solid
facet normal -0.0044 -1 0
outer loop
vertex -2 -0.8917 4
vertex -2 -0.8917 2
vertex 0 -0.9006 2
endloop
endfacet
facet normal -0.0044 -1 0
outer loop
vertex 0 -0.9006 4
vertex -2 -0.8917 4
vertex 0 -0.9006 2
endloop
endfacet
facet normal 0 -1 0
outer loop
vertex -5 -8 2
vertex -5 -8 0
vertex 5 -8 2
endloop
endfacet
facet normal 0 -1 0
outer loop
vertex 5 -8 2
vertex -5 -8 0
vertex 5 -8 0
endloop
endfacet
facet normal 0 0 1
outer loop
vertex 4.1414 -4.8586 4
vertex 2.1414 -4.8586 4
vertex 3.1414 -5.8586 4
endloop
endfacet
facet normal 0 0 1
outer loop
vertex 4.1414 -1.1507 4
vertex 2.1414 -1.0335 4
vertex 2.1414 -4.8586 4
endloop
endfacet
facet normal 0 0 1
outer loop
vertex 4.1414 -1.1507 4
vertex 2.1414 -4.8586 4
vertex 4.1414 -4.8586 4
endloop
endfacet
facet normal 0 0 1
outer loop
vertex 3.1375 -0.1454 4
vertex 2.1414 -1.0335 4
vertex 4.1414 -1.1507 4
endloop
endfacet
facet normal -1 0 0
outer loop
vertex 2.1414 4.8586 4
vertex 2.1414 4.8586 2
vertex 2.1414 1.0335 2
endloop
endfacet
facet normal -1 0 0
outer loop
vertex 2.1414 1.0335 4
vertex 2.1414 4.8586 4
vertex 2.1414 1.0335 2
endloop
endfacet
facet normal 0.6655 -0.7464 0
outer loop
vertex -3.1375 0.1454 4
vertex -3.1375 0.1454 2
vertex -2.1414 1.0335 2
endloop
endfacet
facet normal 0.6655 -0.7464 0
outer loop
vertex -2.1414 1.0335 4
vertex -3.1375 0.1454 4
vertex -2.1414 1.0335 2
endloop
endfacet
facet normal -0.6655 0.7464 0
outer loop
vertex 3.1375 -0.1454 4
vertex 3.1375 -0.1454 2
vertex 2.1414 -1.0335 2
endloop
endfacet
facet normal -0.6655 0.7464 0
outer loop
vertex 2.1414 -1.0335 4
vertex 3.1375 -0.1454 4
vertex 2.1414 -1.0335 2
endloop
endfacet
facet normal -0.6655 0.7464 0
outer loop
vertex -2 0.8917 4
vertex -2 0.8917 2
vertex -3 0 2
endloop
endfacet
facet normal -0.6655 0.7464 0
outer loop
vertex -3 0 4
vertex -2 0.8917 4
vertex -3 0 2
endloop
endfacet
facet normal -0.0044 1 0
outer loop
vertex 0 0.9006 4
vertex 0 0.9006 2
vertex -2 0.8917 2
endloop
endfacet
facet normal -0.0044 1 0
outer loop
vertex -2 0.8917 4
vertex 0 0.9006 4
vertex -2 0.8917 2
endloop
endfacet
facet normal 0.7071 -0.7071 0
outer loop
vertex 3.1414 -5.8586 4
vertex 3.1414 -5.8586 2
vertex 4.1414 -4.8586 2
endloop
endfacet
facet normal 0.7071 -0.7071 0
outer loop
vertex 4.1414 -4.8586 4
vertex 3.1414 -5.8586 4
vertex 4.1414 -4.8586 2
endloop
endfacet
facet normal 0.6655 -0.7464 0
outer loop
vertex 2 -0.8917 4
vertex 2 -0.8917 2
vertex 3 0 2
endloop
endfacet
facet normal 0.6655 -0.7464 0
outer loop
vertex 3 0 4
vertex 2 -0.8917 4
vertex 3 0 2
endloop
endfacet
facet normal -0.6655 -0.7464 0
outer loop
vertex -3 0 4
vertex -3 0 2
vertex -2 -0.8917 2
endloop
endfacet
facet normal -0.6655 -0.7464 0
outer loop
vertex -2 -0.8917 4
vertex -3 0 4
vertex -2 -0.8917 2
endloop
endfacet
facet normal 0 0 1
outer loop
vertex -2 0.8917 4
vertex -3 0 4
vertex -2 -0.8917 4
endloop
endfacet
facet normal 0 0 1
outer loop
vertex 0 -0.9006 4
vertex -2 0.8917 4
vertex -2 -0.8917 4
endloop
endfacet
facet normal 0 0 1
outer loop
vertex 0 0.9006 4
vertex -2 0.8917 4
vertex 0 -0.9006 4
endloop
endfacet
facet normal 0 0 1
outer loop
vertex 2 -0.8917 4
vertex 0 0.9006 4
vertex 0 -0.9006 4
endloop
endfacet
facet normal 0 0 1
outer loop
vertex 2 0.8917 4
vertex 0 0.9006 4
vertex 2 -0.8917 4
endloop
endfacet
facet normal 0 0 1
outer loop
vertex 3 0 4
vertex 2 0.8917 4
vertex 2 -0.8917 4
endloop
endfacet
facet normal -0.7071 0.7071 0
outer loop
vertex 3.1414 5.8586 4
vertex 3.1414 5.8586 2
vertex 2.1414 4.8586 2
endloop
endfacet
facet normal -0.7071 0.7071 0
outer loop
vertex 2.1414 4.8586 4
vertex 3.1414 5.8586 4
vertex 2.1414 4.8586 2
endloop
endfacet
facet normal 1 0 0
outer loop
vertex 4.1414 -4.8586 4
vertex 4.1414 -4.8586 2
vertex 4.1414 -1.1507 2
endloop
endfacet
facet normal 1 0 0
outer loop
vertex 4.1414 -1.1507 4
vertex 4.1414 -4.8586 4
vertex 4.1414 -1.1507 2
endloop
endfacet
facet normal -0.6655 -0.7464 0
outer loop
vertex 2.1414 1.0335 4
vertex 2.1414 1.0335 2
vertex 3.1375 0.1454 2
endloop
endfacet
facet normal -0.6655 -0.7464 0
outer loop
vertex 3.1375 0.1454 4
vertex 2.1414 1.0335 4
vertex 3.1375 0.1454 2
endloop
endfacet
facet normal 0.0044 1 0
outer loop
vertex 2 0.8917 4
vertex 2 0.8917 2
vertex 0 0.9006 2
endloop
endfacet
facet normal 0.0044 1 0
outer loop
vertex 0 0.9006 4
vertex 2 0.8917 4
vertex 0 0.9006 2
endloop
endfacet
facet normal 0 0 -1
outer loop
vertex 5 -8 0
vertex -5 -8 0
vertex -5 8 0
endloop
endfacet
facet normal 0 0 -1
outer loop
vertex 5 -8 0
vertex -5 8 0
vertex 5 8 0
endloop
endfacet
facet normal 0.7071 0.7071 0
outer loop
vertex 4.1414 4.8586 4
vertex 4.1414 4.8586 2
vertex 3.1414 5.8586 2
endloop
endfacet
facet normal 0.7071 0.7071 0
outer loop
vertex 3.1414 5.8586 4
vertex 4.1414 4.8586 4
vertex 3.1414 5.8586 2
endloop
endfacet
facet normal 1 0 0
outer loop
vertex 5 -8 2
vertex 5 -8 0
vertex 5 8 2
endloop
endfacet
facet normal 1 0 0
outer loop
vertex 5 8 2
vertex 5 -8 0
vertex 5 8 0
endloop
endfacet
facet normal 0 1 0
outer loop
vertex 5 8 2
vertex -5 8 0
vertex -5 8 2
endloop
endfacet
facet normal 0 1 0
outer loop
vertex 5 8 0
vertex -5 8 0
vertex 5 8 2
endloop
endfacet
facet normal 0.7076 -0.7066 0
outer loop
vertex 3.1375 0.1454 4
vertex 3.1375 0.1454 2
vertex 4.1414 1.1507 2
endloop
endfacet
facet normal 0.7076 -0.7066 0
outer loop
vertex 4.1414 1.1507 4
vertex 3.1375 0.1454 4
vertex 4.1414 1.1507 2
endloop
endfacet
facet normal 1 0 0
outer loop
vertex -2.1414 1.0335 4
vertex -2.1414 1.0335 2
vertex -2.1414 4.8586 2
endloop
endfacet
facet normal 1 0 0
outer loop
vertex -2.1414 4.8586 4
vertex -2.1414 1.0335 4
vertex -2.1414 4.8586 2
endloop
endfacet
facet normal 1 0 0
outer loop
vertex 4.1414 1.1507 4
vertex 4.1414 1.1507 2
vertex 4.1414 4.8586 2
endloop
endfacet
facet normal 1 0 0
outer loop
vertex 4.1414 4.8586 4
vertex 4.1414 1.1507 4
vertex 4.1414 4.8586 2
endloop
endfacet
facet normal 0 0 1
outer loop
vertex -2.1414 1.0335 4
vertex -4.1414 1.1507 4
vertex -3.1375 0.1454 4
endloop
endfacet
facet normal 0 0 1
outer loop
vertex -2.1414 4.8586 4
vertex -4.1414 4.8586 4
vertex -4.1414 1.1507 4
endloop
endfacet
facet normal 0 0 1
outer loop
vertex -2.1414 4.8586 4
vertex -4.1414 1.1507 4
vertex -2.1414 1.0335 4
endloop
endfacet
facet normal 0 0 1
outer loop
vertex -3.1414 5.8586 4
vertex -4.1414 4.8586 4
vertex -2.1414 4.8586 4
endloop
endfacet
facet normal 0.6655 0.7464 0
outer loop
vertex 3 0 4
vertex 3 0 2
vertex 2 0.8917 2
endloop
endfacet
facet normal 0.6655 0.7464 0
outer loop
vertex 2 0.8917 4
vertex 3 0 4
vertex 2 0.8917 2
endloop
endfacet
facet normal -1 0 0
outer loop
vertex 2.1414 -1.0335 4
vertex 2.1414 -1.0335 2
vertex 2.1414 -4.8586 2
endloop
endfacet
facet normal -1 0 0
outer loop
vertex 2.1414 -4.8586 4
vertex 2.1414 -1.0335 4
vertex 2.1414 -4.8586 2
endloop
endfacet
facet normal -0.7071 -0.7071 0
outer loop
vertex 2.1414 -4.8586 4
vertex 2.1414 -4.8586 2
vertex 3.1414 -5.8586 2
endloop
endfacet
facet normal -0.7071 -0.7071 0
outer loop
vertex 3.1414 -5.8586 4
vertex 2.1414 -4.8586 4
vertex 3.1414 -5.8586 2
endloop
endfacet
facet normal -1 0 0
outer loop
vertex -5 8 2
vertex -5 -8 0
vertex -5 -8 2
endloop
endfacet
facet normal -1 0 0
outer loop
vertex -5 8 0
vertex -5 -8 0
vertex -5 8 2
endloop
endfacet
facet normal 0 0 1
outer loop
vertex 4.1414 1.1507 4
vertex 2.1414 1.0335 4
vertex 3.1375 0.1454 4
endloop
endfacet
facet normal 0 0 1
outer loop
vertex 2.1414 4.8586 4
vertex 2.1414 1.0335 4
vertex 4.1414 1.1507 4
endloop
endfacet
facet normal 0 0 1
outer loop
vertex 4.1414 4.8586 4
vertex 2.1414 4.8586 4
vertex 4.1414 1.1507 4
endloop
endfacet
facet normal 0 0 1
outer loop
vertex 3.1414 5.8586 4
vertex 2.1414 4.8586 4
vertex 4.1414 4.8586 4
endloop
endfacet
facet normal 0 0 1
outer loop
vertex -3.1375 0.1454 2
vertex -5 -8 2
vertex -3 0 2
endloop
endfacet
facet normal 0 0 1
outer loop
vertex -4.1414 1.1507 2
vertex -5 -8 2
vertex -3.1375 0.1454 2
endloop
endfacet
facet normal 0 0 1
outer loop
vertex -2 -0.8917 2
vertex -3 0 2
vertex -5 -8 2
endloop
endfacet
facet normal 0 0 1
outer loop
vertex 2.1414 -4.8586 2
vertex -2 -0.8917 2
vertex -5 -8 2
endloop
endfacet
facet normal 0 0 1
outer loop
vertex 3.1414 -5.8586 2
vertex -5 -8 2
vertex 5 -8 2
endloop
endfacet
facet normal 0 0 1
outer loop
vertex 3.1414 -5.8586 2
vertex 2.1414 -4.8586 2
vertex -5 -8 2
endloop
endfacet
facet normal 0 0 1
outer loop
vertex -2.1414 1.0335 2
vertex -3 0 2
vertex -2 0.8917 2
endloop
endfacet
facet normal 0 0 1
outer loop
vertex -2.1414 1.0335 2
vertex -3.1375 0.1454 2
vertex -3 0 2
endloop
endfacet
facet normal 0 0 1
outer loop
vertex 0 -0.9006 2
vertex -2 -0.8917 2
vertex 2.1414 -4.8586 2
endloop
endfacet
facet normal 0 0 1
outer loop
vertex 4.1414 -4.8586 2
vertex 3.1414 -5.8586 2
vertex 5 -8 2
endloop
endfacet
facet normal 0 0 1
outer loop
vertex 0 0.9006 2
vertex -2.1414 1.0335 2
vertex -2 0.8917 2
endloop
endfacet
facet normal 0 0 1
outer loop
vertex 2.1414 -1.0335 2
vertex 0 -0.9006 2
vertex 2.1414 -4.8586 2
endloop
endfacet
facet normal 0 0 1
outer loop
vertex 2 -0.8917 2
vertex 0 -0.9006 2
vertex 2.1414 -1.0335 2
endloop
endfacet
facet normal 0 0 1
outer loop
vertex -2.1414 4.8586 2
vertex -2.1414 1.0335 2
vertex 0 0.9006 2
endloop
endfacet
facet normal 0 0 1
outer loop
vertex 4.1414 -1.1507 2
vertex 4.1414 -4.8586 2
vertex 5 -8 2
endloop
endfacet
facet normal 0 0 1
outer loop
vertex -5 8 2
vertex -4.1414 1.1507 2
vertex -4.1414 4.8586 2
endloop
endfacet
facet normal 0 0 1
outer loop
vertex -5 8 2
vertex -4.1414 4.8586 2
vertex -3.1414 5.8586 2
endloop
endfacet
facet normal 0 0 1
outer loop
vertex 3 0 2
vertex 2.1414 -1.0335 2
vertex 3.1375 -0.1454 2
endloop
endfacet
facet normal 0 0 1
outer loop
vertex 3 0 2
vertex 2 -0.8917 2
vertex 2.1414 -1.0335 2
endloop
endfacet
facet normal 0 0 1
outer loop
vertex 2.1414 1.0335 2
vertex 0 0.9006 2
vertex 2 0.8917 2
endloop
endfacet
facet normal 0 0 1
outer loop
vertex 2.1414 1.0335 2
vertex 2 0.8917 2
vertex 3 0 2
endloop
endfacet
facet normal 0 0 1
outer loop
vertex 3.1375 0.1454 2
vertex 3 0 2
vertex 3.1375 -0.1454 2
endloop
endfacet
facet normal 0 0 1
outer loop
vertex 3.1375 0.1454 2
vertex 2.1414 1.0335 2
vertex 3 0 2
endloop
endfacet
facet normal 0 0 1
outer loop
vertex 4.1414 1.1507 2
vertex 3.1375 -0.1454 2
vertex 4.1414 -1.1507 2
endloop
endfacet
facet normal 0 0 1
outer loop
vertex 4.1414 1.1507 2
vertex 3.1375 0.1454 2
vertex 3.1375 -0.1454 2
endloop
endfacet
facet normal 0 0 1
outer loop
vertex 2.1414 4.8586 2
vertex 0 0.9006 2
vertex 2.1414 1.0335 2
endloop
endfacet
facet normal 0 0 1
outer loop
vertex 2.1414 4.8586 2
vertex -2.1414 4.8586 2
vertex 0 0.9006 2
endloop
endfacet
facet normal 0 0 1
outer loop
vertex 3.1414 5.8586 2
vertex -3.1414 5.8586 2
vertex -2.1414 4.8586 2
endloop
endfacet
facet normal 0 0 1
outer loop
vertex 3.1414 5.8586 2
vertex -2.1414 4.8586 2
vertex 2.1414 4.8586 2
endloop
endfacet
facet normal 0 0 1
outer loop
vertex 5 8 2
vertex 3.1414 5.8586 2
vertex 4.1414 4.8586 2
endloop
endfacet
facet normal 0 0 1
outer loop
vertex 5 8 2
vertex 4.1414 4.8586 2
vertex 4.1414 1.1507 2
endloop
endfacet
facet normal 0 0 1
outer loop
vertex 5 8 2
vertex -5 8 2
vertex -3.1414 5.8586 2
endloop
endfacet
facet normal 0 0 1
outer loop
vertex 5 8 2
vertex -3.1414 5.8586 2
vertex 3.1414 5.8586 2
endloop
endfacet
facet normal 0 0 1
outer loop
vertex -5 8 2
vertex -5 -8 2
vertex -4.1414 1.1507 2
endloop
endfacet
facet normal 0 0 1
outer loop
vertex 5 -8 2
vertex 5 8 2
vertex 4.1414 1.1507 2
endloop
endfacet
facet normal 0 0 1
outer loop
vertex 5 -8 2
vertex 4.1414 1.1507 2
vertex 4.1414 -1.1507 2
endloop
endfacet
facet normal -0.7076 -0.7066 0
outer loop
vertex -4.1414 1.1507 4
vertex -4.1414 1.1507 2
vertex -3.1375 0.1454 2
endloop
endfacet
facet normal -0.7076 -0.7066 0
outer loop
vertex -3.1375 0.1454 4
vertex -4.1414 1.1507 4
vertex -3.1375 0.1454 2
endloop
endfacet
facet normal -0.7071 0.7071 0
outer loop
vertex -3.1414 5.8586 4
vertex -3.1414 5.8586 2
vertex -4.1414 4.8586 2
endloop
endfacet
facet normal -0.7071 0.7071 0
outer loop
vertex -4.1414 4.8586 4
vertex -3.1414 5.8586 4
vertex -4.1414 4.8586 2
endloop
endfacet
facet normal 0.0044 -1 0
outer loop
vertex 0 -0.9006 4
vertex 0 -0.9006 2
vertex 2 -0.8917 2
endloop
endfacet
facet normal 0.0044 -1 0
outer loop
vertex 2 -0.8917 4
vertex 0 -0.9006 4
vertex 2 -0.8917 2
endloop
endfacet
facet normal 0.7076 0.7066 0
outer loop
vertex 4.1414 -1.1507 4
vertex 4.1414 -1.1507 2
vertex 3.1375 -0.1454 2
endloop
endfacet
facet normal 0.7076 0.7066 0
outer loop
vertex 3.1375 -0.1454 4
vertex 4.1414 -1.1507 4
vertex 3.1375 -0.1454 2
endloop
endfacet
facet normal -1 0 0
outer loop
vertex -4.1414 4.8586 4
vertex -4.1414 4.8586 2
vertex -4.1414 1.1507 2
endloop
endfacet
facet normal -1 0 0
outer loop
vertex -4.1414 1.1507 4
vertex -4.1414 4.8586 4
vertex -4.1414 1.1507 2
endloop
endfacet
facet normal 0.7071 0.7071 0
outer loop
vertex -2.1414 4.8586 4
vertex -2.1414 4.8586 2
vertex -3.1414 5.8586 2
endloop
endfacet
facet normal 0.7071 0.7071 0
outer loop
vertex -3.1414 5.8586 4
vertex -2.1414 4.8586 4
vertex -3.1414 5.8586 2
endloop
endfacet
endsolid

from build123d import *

# Parameters (mm, degrees)
F0_W     = 10
F0_H     = 16
F1_DEPTH = 2
F3_DEPTH = 2


# Not quite as in the source:
# - ends of sketch curves that miss each other by under 0.0002 mm in the source are joined


with BuildPart() as f1:
    # F0 (on Top) → F1 (new body)
    with BuildSketch(Plane.XY):
        Rectangle(F0_W, F0_H)
    extrude(amount=F1_DEPTH)

    # F2 (on face) → F3 (join)
    with BuildSketch(Plane.XY.offset(2)):
        Polygon((-2.1414213562, 4.8585786438), (-3.1414213562, 5.8585786438), (-4.1414213562, 4.8585786438), (-4.1414213562, 1.1507223826), (-3.1374518146, 0.1453992321), (-2.1414213562, 1.0335195075), align=None)
        Polygon((2, 0.891659756), (2.00782e-05, 0.9006214721), (-2, 0.891659756), (-3, 0), (-2, -0.891659756), (-2.00782e-05, -0.9006214721), (2, -0.891659756), (3, 0), align=None)
        Polygon((4.1414213562, 4.8585786438), (3.1414213562, 5.8585786438), (2.1414213562, 4.8585786438), (2.1414213562, 1.0335195075), (3.1374518146, 0.1453992321), (4.1414213562, 1.1507223826), align=None)
        Polygon((3.1374518146, -0.1453992321), (2.1414213562, -1.0335195075), (2.1414213562, -4.8585786438), (3.1414213562, -5.8585786438), (4.1414213562, -4.8585786438), (4.1414213562, -1.1507223826), align=None)
    extrude(amount=F3_DEPTH)


solid = f1.part
